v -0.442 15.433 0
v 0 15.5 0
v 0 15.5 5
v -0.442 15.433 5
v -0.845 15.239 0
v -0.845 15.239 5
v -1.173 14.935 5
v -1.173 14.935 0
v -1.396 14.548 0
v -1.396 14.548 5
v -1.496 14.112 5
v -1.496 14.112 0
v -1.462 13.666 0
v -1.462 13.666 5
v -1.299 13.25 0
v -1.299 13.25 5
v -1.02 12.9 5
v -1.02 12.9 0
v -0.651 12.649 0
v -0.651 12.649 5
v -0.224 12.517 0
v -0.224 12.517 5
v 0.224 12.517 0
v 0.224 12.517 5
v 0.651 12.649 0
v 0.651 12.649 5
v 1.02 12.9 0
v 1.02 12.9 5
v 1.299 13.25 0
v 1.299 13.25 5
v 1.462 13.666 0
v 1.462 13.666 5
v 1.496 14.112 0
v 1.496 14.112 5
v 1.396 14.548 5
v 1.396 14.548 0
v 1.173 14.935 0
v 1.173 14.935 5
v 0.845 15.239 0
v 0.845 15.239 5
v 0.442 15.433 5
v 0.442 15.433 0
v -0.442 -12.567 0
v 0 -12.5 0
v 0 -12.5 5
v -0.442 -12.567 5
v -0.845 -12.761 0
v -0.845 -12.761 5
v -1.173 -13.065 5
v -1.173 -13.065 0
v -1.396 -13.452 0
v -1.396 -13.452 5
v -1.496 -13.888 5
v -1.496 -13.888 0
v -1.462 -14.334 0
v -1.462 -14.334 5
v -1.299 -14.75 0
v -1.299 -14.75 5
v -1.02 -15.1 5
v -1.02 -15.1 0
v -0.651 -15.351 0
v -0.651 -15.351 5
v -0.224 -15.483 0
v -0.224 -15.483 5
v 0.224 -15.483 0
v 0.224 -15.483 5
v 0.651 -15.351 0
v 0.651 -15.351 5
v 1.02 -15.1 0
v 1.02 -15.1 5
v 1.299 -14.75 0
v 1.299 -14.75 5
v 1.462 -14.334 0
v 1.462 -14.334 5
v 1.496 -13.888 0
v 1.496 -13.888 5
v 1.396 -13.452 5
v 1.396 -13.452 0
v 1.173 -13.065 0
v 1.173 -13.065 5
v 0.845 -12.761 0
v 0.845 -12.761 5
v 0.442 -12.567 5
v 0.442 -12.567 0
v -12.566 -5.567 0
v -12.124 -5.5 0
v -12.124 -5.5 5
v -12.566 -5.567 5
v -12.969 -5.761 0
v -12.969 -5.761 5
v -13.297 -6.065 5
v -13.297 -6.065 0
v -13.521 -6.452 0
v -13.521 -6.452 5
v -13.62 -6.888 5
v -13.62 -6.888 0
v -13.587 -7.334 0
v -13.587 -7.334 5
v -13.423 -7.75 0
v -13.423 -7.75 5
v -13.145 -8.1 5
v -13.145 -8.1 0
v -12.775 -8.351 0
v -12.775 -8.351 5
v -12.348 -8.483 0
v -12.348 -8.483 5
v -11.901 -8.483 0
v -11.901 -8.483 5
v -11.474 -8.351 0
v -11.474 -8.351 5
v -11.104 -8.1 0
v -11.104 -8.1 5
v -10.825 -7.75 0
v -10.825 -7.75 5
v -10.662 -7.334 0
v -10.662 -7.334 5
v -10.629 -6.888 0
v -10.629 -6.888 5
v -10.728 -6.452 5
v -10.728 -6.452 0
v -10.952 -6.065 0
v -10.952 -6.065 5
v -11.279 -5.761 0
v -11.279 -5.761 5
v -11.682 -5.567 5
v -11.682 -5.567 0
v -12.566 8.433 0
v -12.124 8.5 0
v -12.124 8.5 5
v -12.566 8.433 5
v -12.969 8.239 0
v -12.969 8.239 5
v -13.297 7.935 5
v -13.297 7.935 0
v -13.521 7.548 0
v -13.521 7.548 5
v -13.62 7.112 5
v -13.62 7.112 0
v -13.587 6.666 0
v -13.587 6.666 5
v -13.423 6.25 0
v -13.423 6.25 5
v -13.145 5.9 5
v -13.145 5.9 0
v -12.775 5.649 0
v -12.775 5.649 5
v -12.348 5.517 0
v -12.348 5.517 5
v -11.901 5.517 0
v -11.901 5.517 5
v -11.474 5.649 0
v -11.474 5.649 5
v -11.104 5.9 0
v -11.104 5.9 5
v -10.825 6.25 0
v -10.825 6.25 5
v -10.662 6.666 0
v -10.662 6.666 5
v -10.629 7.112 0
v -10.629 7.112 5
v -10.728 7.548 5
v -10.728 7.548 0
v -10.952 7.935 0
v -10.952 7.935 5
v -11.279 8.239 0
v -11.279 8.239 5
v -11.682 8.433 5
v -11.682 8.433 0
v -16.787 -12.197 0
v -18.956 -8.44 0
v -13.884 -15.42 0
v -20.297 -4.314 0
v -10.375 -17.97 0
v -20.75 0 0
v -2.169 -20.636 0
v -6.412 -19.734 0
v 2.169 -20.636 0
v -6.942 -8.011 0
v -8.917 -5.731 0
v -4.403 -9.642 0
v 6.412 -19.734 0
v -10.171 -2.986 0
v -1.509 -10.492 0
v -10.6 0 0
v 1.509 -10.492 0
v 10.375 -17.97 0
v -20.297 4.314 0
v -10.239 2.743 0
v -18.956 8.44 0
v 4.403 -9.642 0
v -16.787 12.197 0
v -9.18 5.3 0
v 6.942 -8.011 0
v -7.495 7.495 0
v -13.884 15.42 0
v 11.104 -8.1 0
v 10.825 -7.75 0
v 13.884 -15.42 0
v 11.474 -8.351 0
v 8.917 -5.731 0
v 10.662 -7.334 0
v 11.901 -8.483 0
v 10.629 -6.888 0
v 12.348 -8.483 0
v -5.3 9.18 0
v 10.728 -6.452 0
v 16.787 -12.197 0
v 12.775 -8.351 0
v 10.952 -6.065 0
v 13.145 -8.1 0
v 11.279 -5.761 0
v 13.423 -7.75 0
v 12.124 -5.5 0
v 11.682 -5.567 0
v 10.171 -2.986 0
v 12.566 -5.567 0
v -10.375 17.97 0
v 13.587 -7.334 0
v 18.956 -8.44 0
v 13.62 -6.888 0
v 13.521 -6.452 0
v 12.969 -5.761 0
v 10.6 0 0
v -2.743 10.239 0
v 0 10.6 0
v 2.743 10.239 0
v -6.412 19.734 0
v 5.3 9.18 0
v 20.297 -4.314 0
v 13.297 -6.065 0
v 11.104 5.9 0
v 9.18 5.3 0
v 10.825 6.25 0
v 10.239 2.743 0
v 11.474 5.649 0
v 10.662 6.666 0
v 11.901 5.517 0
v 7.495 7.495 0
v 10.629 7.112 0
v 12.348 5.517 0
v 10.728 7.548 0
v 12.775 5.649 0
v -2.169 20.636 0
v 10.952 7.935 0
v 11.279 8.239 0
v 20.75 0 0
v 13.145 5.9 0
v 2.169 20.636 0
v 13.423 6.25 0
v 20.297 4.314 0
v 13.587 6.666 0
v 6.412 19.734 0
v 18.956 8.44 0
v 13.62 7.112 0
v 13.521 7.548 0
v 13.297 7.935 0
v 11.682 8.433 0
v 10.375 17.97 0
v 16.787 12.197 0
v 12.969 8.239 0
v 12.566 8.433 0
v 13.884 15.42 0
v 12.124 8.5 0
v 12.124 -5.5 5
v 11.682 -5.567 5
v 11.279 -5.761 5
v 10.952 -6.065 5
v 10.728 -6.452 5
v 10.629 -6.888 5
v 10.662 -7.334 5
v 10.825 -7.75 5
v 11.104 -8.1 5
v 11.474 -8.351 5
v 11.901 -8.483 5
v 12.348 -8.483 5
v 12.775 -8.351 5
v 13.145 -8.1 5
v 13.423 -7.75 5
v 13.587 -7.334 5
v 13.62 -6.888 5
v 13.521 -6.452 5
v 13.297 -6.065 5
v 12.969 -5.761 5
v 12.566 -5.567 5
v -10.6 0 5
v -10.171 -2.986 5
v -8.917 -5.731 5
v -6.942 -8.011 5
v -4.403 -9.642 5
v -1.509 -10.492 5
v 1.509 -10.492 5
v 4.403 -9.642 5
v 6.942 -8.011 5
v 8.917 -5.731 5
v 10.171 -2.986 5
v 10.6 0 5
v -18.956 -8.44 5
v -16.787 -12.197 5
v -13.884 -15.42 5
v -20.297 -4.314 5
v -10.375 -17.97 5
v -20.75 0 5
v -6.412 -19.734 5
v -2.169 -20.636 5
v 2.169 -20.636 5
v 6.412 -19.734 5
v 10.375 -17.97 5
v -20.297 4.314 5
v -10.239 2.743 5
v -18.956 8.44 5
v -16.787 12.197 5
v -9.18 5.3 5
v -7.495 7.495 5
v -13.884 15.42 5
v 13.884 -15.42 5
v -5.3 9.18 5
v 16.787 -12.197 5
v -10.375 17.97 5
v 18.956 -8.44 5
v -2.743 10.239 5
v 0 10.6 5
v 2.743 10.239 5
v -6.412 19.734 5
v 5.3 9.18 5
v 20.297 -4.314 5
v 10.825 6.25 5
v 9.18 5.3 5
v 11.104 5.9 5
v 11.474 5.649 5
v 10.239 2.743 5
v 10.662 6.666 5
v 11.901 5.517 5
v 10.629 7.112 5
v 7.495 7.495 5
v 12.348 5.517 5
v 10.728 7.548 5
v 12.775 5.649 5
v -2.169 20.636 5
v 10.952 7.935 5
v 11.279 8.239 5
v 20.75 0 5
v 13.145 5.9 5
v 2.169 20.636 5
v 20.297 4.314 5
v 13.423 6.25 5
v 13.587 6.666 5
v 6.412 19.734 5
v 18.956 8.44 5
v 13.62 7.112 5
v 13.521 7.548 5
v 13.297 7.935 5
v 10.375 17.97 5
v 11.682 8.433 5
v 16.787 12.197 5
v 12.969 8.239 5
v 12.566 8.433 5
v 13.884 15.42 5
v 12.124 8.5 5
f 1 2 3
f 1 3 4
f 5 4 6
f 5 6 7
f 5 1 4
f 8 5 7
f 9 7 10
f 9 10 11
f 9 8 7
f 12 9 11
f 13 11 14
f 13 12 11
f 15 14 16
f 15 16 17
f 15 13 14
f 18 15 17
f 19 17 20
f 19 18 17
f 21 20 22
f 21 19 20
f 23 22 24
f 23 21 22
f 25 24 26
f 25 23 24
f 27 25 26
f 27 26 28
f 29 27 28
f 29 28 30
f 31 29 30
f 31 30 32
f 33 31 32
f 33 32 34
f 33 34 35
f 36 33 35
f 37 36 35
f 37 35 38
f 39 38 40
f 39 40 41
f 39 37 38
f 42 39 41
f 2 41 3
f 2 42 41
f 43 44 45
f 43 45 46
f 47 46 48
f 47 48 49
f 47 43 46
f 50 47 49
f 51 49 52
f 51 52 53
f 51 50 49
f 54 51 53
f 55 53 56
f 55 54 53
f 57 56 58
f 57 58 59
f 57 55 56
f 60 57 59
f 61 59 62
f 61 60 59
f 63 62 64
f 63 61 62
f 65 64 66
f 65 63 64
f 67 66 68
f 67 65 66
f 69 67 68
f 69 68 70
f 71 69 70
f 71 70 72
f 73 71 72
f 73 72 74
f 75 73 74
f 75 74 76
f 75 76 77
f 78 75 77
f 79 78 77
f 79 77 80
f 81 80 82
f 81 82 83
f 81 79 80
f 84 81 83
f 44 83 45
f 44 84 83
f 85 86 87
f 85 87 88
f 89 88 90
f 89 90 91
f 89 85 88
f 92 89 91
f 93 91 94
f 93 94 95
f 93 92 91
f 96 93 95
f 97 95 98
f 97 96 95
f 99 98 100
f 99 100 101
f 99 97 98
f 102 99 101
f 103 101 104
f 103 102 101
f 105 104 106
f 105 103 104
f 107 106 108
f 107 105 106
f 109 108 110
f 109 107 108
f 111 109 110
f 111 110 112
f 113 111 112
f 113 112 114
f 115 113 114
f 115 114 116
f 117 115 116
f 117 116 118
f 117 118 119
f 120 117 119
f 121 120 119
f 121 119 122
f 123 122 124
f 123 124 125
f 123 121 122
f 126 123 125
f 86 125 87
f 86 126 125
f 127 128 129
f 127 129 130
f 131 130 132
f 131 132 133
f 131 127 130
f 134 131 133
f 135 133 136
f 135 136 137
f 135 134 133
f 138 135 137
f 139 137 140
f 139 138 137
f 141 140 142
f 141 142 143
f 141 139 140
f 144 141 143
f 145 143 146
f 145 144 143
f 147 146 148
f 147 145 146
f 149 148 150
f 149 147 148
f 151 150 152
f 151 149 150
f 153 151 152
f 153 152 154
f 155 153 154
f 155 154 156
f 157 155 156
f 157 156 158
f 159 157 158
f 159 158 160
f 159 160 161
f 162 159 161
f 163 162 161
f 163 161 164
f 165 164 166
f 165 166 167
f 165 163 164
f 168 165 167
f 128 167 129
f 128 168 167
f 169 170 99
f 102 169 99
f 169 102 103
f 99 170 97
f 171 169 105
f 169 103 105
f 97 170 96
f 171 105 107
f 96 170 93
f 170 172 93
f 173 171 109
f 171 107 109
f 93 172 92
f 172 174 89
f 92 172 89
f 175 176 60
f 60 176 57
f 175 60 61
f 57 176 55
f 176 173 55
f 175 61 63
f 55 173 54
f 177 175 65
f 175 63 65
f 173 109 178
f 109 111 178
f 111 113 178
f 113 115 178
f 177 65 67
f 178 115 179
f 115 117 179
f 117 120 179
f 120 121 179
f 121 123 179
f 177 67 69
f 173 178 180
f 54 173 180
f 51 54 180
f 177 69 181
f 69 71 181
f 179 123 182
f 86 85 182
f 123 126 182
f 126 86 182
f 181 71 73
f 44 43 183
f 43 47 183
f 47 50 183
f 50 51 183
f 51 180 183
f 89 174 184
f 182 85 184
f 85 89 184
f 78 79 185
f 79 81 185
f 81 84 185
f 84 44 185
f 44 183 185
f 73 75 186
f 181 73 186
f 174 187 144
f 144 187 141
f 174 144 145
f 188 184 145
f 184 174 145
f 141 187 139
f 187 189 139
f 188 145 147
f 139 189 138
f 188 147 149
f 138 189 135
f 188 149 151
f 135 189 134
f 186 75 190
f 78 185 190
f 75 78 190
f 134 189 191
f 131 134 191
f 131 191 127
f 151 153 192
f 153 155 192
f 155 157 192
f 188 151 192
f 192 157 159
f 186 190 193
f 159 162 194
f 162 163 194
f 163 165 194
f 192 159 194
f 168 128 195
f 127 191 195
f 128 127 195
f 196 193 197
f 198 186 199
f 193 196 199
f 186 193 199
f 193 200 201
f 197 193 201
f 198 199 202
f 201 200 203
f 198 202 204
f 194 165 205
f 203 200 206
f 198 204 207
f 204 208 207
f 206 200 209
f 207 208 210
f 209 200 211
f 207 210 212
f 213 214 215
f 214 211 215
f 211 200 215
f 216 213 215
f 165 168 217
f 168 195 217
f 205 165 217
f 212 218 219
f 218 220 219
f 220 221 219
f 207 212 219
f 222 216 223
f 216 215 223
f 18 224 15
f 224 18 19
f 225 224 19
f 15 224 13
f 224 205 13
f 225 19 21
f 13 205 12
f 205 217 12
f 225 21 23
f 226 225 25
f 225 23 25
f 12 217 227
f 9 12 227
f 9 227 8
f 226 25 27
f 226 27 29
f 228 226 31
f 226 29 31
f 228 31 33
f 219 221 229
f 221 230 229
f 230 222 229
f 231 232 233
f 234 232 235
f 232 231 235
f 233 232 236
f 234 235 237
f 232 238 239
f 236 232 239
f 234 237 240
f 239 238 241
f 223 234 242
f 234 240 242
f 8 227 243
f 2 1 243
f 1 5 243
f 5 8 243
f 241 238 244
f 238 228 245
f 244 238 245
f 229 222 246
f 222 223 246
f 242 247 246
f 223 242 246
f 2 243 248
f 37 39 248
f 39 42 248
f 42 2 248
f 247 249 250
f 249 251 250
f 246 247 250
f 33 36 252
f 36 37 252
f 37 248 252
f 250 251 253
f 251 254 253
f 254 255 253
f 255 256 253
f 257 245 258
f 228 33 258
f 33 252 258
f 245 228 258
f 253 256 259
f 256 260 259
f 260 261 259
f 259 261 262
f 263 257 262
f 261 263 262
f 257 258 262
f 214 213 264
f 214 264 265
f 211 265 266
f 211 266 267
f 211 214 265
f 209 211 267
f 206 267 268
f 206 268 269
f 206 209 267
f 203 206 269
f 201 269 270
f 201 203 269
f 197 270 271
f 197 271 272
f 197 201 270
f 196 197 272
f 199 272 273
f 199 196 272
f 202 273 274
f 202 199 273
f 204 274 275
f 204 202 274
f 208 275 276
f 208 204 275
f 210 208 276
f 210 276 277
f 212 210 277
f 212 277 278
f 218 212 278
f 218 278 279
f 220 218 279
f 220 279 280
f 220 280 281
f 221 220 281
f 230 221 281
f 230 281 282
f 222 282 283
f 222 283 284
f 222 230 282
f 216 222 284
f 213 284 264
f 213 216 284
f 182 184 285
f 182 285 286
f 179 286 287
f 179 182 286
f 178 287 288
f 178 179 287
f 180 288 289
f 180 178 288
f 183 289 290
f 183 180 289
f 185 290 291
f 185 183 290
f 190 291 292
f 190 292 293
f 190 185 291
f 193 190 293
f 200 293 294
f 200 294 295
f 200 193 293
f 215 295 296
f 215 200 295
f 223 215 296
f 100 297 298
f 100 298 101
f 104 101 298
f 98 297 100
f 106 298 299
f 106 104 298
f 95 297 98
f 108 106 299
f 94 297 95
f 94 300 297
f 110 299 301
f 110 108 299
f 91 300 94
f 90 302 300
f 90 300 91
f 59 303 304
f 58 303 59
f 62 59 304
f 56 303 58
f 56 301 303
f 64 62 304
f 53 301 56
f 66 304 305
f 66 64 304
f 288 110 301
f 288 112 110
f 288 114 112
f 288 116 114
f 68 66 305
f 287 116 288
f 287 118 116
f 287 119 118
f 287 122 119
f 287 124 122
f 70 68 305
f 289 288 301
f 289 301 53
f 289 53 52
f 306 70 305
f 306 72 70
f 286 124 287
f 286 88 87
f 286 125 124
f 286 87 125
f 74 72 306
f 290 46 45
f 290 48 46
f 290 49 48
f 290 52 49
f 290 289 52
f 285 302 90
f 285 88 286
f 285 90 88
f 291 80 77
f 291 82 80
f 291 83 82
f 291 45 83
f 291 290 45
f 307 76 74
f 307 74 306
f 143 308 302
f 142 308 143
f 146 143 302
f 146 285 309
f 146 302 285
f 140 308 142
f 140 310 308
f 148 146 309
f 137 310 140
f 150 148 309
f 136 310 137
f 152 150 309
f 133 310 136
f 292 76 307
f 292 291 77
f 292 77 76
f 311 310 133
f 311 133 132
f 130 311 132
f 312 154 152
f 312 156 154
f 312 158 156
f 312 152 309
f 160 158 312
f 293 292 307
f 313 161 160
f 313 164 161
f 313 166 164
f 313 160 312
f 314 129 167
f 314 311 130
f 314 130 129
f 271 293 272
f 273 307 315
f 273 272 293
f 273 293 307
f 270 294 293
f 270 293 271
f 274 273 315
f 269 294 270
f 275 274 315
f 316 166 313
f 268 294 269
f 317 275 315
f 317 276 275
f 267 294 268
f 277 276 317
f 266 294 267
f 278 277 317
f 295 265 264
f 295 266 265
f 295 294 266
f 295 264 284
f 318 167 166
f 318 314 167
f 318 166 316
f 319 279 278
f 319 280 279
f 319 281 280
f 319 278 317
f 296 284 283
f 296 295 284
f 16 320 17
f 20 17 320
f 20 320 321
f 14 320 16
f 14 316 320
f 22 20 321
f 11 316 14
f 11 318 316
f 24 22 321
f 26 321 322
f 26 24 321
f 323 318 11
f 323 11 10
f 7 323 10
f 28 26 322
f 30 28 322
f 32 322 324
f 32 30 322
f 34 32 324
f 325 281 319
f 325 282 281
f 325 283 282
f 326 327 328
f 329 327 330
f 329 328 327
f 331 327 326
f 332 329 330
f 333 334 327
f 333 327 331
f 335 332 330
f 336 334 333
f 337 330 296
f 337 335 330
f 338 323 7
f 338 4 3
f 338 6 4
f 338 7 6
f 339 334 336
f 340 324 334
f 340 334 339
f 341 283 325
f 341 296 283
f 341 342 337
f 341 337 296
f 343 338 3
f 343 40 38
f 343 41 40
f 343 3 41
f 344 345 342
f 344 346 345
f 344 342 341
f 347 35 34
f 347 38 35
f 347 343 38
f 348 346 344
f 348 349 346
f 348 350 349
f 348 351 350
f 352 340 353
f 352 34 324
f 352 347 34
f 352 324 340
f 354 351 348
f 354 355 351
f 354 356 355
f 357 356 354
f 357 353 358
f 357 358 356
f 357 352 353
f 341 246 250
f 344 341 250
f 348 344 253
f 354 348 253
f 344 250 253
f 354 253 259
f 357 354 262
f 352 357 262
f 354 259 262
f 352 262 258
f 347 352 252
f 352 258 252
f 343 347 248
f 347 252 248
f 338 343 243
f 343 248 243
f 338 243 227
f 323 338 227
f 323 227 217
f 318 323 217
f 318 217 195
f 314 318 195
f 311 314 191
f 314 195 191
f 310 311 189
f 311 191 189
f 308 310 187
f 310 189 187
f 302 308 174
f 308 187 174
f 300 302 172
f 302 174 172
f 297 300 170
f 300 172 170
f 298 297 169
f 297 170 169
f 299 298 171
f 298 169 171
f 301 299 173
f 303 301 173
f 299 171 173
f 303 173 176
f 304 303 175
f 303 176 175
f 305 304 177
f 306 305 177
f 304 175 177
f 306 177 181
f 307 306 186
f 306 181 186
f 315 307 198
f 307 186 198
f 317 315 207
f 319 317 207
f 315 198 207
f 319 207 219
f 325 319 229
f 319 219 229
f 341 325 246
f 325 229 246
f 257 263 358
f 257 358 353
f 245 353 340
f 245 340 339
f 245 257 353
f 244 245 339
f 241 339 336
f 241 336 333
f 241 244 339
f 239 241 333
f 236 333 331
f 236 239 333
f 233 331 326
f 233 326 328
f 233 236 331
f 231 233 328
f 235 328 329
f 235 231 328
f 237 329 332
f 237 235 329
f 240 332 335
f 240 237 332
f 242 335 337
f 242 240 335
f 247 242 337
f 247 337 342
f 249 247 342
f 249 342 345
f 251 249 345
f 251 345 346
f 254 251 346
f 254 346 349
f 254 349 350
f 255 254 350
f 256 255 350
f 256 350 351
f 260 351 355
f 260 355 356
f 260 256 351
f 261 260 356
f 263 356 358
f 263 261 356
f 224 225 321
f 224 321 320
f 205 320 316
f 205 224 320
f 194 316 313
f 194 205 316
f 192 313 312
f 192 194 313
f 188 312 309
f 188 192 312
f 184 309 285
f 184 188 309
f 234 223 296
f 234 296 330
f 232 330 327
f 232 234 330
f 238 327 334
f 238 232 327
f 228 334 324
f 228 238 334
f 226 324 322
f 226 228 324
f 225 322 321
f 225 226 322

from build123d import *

# Parameters (mm, degrees)
SKETCH_1_R      = 20.75
EXTRUDE_1_DEPTH = 5


with BuildPart() as part:
    # 草图1 → 凸台-拉伸1 (new body)
    with BuildSketch(Plane.XY):
        Circle(SKETCH_1_R)
        with BuildLine():
            ThreePointArc((-12.124355653, 5.5), (-10.624355653, 7), (-12.124355653, 8.5))
            ThreePointArc((-12.124355653, 8.5), (-13.624355653, 7), (-12.124355653, 5.5))
        make_face(mode=Mode.SUBTRACT)
        with BuildLine():
            ThreePointArc((-12.124355653, -8.5), (-10.624355653, -7), (-12.124355653, -5.5))
            ThreePointArc((-12.124355653, -5.5), (-13.624355653, -7), (-12.124355653, -8.5))
        make_face(mode=Mode.SUBTRACT)
        with BuildLine():
            ThreePointArc((0, -15.5), (1.5, -14), (0, -12.5))
            ThreePointArc((0, -12.5), (-1.5, -14), (0, -15.5))
        make_face(mode=Mode.SUBTRACT)
        with BuildLine():
            ThreePointArc((12.124355653, -8.5), (13.624355653, -7), (12.124355653, -5.5))
            ThreePointArc((12.124355653, -5.5), (10.624355653, -7), (12.124355653, -8.5))
        make_face(mode=Mode.SUBTRACT)
        with BuildLine():
            ThreePointArc((12.124355653, 5.5), (13.624355653, 7), (12.124355653, 8.5))
            ThreePointArc((12.124355653, 8.5), (10.624355653, 7), (12.124355653, 5.5))
        make_face(mode=Mode.SUBTRACT)
        with BuildLine():
            ThreePointArc((0, 12.5), (1.5, 14), (0, 15.5))
            ThreePointArc((0, 15.5), (-1.5, 14), (0, 12.5))
        make_face(mode=Mode.SUBTRACT)
        with BuildLine():
            ThreePointArc((10.6, 0), (7.495331881, 7.495331881), (0, 10.6))
            ThreePointArc((0, 10.6), (-7.495331881, 7.495331881), (-10.6, 0))
            ThreePointArc((-10.6, 0), (0, -10.6), (10.6, 0))
        make_face(mode=Mode.SUBTRACT)
    extrude(amount=EXTRUDE_1_DEPTH)


solid = part.part
